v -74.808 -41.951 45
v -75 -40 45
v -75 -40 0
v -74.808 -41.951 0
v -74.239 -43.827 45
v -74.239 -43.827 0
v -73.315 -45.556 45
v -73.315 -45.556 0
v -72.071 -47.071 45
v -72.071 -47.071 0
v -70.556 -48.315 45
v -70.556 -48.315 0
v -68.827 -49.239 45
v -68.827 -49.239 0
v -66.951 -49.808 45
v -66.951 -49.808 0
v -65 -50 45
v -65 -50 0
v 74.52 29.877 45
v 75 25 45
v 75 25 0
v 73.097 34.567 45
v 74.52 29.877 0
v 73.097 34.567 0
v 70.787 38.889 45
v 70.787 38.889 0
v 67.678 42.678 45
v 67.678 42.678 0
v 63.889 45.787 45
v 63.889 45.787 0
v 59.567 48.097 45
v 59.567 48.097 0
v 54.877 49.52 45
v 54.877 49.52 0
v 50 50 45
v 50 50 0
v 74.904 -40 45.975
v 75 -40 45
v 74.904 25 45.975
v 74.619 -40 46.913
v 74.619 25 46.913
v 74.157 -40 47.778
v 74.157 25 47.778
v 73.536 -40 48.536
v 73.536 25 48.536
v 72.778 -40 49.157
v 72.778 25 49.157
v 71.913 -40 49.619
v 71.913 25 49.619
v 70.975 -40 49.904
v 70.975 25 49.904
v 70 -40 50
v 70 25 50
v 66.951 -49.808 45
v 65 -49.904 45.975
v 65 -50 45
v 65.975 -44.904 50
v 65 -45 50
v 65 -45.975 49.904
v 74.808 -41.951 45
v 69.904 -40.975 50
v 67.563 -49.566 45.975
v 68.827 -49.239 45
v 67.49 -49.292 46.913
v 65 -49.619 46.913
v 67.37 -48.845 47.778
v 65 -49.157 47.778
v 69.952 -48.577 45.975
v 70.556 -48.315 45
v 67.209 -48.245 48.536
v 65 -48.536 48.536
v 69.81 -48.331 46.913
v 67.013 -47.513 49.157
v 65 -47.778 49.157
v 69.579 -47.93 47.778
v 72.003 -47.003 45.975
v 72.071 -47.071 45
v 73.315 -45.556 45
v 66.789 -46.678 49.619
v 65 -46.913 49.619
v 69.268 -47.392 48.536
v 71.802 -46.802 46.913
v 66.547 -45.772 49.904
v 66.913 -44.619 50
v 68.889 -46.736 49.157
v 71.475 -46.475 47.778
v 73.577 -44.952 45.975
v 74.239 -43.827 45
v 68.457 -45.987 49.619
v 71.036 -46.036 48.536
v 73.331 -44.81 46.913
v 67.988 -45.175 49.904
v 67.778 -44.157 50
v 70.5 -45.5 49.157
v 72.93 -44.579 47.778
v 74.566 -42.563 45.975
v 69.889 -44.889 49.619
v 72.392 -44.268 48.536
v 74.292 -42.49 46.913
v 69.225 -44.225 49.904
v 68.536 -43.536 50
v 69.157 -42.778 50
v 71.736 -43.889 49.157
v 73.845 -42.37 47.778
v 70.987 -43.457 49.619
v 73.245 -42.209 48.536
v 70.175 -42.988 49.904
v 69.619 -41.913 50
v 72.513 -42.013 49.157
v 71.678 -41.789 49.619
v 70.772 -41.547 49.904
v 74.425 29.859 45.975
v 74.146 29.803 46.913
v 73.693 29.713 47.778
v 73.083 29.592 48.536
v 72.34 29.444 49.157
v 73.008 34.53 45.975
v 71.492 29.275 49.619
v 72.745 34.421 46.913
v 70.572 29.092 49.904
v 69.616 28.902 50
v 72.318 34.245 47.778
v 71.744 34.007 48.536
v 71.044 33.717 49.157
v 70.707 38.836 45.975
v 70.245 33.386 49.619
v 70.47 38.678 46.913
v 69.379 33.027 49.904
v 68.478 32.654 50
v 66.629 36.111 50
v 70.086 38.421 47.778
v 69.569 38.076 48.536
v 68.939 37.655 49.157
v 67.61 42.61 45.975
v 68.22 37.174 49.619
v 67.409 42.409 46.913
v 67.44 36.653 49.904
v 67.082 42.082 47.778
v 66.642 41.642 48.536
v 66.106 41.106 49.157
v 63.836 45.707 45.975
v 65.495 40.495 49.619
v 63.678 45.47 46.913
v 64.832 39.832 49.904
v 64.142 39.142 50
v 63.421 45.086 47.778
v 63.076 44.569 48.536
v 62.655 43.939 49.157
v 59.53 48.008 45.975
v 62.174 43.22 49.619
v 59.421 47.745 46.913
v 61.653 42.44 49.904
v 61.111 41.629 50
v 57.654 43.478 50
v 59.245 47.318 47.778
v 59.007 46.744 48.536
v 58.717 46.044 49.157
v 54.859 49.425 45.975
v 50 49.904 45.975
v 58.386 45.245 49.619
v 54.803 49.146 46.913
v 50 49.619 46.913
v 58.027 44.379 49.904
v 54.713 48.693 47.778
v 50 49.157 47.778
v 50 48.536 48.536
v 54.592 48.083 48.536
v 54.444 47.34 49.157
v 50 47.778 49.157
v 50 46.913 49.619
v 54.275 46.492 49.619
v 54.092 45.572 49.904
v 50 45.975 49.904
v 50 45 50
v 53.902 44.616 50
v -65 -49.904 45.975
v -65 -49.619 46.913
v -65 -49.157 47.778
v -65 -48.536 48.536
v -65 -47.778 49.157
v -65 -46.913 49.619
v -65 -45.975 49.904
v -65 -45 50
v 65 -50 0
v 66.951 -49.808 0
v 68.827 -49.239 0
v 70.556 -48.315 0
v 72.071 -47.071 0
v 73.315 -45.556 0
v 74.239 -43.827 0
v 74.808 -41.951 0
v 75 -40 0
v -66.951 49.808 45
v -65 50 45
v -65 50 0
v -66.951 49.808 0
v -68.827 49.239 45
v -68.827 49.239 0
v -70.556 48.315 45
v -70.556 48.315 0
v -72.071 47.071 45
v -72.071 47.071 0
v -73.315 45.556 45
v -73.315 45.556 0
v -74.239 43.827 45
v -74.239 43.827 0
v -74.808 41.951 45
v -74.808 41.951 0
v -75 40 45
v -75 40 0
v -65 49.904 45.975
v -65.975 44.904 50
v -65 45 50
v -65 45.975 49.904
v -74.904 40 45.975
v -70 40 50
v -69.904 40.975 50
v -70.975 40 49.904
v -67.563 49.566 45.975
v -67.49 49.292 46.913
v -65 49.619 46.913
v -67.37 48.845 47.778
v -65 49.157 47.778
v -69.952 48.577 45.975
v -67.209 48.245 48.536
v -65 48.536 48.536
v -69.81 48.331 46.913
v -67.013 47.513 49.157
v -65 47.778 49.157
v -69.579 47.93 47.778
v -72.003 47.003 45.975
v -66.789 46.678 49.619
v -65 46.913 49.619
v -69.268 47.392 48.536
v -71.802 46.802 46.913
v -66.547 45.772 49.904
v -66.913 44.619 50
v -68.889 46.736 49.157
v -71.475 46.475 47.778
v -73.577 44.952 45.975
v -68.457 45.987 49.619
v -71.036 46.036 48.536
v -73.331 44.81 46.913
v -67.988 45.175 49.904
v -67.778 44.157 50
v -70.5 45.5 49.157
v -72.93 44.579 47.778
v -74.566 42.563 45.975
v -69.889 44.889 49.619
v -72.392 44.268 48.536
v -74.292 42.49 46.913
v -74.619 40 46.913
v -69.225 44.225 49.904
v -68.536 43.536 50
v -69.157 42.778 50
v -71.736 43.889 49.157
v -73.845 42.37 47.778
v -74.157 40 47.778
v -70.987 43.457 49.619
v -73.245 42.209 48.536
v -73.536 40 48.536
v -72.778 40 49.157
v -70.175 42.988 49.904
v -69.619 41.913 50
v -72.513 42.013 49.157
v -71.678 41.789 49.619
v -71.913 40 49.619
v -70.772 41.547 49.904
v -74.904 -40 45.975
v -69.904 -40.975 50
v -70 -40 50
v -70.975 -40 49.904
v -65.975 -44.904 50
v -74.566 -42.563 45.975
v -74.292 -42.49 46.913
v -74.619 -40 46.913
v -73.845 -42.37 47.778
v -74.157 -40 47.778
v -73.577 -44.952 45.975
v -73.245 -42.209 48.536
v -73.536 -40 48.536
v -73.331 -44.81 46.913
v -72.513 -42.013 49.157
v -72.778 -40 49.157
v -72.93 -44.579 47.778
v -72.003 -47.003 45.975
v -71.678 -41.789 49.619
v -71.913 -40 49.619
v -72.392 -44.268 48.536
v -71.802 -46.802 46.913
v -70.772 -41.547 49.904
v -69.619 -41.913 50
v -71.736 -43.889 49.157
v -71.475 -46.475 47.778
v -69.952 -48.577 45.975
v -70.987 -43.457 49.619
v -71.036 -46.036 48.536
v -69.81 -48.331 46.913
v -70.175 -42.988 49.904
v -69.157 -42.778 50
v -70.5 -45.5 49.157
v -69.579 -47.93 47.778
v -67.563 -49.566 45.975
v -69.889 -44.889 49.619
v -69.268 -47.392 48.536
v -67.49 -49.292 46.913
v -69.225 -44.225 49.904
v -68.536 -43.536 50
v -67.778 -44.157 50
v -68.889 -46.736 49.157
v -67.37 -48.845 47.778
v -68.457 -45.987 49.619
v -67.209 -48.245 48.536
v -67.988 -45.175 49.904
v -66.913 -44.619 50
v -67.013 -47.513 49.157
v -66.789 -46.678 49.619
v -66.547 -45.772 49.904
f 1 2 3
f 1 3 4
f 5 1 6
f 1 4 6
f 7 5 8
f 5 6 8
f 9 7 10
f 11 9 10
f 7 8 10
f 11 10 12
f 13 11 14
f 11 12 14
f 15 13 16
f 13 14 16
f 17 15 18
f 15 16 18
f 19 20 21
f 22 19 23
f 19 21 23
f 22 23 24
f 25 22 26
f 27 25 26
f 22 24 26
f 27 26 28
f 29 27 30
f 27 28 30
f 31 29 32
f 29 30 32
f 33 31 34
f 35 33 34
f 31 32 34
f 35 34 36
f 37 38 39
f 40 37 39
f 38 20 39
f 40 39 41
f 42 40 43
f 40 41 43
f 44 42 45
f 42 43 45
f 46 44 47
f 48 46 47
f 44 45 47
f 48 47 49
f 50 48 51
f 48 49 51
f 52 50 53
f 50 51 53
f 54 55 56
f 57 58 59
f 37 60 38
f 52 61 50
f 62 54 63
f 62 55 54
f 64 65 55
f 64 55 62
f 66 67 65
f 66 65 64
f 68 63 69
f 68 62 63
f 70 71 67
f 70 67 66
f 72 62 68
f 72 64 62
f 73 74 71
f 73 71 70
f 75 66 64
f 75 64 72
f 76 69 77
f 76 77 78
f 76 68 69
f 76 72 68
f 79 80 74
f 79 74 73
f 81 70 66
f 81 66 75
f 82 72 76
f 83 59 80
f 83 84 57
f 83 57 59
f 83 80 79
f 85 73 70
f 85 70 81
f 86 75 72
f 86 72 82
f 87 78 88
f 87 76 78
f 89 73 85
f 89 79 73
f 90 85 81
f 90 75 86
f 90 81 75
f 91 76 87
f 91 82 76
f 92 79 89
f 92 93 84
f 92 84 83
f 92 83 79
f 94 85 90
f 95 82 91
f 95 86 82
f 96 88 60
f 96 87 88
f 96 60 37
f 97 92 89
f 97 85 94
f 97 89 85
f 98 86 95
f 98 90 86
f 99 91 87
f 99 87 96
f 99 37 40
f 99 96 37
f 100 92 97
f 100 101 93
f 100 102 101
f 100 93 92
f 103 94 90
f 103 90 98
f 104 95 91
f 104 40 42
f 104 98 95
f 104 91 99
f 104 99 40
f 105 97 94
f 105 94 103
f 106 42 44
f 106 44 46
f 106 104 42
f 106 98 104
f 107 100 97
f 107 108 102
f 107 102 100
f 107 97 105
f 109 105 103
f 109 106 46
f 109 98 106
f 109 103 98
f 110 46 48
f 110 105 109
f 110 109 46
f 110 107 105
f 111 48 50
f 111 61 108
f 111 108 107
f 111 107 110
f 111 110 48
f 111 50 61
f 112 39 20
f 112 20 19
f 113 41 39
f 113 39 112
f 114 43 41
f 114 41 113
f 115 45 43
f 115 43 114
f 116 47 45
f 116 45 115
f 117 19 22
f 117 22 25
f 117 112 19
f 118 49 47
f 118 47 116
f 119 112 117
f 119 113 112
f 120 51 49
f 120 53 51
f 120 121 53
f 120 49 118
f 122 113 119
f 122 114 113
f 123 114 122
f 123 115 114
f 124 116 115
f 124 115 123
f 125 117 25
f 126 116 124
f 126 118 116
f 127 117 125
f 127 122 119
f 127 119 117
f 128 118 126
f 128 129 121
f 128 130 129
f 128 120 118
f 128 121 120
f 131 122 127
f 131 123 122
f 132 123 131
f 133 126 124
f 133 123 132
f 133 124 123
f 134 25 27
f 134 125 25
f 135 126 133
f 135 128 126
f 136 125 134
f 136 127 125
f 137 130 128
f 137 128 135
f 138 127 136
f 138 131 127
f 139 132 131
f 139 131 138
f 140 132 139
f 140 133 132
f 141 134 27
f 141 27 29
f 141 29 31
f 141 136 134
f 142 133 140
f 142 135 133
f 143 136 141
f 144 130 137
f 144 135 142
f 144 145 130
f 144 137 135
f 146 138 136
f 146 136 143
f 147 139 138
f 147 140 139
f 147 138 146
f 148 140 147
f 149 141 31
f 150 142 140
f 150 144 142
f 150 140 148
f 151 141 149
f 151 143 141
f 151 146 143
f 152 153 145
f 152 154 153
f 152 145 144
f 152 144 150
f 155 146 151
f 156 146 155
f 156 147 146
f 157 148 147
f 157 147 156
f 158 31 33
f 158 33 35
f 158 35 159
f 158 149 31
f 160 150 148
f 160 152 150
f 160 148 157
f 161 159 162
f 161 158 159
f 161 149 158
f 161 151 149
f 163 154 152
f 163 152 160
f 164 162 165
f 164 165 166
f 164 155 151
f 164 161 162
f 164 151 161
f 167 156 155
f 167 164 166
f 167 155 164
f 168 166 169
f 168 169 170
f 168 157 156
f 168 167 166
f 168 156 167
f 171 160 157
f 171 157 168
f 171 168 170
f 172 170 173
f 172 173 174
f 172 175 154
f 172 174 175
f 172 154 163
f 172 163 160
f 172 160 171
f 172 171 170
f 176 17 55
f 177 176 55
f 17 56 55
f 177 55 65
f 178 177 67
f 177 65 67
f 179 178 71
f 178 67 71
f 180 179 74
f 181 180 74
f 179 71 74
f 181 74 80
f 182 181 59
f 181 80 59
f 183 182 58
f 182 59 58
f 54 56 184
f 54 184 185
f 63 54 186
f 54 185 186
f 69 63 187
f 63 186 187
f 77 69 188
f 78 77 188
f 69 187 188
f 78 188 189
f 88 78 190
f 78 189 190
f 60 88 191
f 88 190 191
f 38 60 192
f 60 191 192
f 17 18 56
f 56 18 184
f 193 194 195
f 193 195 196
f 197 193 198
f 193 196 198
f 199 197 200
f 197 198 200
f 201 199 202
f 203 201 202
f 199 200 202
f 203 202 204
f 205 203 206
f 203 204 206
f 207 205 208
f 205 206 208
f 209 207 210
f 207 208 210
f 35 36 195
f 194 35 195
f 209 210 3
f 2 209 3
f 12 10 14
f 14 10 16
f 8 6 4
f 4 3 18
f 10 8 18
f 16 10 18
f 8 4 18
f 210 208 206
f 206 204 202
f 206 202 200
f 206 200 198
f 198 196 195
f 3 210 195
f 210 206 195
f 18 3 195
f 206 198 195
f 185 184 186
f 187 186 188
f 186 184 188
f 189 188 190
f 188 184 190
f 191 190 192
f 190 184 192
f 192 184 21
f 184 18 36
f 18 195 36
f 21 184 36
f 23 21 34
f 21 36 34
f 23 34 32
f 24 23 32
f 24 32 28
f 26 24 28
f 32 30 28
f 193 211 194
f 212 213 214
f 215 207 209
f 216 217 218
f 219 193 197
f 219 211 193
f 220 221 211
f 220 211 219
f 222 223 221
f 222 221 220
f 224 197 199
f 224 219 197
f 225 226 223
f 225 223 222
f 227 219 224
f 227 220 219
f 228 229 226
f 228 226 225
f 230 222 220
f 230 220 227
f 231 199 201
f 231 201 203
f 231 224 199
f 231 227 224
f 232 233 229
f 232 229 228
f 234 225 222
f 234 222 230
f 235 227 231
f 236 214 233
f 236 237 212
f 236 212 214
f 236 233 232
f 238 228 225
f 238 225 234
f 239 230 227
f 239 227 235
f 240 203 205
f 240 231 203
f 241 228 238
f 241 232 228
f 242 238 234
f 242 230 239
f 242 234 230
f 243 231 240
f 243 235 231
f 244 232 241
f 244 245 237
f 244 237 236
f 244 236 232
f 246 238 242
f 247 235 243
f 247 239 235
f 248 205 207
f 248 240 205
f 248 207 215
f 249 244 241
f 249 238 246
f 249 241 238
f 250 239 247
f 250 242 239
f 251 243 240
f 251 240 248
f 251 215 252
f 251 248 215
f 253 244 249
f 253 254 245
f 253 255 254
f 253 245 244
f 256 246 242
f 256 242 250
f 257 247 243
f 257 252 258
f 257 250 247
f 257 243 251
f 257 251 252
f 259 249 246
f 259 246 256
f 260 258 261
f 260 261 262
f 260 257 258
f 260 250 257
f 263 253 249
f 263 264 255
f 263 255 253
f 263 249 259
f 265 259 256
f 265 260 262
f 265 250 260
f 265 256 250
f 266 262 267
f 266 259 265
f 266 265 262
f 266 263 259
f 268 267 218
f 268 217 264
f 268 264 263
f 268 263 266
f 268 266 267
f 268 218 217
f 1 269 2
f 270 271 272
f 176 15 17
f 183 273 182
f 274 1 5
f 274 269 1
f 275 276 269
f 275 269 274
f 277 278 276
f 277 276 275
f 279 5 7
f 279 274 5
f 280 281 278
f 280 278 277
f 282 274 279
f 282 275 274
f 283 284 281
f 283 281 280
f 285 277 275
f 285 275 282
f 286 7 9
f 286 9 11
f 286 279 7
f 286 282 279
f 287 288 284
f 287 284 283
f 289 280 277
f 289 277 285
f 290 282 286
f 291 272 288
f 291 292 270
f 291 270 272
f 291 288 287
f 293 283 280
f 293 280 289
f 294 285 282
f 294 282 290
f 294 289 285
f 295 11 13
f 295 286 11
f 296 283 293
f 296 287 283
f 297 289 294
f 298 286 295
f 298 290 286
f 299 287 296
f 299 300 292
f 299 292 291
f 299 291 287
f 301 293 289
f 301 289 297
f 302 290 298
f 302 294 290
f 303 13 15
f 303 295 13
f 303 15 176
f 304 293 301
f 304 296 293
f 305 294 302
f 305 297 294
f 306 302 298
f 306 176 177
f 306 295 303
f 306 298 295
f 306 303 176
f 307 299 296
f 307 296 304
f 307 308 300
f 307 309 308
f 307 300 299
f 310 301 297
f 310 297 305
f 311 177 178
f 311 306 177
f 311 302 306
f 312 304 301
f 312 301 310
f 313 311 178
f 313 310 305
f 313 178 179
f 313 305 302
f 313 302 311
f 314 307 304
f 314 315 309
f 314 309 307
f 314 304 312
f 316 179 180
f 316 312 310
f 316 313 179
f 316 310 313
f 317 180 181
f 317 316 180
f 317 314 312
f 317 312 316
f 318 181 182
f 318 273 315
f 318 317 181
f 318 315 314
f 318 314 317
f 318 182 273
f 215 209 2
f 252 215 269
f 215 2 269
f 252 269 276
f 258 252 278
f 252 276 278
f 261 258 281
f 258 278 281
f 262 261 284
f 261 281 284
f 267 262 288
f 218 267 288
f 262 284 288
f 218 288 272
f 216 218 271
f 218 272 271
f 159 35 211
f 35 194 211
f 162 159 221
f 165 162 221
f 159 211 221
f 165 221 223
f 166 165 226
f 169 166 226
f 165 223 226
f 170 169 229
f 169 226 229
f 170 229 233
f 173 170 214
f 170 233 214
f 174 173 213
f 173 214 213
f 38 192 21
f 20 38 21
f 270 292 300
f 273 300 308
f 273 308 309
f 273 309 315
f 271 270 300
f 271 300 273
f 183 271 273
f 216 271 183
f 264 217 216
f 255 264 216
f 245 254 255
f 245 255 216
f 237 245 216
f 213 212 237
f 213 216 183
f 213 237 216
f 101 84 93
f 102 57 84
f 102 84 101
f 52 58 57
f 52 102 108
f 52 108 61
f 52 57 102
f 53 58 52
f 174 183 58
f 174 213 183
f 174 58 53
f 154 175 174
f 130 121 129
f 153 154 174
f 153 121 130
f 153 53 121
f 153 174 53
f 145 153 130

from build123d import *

# Parameters (mm, degrees)
F1_DEPTH = 50
F2_R     = 5


with BuildPart() as f1:
    # F0 (on Top) → F1 (new body)
    with BuildSketch(Plane.XY):
        with BuildLine():
            ThreePointArc((-75, -40), (-72.071068, -47.071068), (-65, -50))
            Line((-65, -50), (65, -50))
            ThreePointArc((65, -50), (72.071068, -47.071068), (75, -40))
            Line((75, -40), (75, 25))
            ThreePointArc((75, 25), (67.67767, 42.67767), (50, 50))
            Line((50, 50), (-65, 50))
            ThreePointArc((-65, 50), (-72.071068, 47.071068), (-75, 40))
            Line((-75, 40), (-75, -40))
        make_face()
    extrude(amount=F1_DEPTH)

    # F2
    f2_edges = [f1.edges().sort_by_distance(p)[0] for p in [
        (75, -7.5, 50),
    ]]
    fillet(f2_edges, radius=F2_R)


solid = f1.part
